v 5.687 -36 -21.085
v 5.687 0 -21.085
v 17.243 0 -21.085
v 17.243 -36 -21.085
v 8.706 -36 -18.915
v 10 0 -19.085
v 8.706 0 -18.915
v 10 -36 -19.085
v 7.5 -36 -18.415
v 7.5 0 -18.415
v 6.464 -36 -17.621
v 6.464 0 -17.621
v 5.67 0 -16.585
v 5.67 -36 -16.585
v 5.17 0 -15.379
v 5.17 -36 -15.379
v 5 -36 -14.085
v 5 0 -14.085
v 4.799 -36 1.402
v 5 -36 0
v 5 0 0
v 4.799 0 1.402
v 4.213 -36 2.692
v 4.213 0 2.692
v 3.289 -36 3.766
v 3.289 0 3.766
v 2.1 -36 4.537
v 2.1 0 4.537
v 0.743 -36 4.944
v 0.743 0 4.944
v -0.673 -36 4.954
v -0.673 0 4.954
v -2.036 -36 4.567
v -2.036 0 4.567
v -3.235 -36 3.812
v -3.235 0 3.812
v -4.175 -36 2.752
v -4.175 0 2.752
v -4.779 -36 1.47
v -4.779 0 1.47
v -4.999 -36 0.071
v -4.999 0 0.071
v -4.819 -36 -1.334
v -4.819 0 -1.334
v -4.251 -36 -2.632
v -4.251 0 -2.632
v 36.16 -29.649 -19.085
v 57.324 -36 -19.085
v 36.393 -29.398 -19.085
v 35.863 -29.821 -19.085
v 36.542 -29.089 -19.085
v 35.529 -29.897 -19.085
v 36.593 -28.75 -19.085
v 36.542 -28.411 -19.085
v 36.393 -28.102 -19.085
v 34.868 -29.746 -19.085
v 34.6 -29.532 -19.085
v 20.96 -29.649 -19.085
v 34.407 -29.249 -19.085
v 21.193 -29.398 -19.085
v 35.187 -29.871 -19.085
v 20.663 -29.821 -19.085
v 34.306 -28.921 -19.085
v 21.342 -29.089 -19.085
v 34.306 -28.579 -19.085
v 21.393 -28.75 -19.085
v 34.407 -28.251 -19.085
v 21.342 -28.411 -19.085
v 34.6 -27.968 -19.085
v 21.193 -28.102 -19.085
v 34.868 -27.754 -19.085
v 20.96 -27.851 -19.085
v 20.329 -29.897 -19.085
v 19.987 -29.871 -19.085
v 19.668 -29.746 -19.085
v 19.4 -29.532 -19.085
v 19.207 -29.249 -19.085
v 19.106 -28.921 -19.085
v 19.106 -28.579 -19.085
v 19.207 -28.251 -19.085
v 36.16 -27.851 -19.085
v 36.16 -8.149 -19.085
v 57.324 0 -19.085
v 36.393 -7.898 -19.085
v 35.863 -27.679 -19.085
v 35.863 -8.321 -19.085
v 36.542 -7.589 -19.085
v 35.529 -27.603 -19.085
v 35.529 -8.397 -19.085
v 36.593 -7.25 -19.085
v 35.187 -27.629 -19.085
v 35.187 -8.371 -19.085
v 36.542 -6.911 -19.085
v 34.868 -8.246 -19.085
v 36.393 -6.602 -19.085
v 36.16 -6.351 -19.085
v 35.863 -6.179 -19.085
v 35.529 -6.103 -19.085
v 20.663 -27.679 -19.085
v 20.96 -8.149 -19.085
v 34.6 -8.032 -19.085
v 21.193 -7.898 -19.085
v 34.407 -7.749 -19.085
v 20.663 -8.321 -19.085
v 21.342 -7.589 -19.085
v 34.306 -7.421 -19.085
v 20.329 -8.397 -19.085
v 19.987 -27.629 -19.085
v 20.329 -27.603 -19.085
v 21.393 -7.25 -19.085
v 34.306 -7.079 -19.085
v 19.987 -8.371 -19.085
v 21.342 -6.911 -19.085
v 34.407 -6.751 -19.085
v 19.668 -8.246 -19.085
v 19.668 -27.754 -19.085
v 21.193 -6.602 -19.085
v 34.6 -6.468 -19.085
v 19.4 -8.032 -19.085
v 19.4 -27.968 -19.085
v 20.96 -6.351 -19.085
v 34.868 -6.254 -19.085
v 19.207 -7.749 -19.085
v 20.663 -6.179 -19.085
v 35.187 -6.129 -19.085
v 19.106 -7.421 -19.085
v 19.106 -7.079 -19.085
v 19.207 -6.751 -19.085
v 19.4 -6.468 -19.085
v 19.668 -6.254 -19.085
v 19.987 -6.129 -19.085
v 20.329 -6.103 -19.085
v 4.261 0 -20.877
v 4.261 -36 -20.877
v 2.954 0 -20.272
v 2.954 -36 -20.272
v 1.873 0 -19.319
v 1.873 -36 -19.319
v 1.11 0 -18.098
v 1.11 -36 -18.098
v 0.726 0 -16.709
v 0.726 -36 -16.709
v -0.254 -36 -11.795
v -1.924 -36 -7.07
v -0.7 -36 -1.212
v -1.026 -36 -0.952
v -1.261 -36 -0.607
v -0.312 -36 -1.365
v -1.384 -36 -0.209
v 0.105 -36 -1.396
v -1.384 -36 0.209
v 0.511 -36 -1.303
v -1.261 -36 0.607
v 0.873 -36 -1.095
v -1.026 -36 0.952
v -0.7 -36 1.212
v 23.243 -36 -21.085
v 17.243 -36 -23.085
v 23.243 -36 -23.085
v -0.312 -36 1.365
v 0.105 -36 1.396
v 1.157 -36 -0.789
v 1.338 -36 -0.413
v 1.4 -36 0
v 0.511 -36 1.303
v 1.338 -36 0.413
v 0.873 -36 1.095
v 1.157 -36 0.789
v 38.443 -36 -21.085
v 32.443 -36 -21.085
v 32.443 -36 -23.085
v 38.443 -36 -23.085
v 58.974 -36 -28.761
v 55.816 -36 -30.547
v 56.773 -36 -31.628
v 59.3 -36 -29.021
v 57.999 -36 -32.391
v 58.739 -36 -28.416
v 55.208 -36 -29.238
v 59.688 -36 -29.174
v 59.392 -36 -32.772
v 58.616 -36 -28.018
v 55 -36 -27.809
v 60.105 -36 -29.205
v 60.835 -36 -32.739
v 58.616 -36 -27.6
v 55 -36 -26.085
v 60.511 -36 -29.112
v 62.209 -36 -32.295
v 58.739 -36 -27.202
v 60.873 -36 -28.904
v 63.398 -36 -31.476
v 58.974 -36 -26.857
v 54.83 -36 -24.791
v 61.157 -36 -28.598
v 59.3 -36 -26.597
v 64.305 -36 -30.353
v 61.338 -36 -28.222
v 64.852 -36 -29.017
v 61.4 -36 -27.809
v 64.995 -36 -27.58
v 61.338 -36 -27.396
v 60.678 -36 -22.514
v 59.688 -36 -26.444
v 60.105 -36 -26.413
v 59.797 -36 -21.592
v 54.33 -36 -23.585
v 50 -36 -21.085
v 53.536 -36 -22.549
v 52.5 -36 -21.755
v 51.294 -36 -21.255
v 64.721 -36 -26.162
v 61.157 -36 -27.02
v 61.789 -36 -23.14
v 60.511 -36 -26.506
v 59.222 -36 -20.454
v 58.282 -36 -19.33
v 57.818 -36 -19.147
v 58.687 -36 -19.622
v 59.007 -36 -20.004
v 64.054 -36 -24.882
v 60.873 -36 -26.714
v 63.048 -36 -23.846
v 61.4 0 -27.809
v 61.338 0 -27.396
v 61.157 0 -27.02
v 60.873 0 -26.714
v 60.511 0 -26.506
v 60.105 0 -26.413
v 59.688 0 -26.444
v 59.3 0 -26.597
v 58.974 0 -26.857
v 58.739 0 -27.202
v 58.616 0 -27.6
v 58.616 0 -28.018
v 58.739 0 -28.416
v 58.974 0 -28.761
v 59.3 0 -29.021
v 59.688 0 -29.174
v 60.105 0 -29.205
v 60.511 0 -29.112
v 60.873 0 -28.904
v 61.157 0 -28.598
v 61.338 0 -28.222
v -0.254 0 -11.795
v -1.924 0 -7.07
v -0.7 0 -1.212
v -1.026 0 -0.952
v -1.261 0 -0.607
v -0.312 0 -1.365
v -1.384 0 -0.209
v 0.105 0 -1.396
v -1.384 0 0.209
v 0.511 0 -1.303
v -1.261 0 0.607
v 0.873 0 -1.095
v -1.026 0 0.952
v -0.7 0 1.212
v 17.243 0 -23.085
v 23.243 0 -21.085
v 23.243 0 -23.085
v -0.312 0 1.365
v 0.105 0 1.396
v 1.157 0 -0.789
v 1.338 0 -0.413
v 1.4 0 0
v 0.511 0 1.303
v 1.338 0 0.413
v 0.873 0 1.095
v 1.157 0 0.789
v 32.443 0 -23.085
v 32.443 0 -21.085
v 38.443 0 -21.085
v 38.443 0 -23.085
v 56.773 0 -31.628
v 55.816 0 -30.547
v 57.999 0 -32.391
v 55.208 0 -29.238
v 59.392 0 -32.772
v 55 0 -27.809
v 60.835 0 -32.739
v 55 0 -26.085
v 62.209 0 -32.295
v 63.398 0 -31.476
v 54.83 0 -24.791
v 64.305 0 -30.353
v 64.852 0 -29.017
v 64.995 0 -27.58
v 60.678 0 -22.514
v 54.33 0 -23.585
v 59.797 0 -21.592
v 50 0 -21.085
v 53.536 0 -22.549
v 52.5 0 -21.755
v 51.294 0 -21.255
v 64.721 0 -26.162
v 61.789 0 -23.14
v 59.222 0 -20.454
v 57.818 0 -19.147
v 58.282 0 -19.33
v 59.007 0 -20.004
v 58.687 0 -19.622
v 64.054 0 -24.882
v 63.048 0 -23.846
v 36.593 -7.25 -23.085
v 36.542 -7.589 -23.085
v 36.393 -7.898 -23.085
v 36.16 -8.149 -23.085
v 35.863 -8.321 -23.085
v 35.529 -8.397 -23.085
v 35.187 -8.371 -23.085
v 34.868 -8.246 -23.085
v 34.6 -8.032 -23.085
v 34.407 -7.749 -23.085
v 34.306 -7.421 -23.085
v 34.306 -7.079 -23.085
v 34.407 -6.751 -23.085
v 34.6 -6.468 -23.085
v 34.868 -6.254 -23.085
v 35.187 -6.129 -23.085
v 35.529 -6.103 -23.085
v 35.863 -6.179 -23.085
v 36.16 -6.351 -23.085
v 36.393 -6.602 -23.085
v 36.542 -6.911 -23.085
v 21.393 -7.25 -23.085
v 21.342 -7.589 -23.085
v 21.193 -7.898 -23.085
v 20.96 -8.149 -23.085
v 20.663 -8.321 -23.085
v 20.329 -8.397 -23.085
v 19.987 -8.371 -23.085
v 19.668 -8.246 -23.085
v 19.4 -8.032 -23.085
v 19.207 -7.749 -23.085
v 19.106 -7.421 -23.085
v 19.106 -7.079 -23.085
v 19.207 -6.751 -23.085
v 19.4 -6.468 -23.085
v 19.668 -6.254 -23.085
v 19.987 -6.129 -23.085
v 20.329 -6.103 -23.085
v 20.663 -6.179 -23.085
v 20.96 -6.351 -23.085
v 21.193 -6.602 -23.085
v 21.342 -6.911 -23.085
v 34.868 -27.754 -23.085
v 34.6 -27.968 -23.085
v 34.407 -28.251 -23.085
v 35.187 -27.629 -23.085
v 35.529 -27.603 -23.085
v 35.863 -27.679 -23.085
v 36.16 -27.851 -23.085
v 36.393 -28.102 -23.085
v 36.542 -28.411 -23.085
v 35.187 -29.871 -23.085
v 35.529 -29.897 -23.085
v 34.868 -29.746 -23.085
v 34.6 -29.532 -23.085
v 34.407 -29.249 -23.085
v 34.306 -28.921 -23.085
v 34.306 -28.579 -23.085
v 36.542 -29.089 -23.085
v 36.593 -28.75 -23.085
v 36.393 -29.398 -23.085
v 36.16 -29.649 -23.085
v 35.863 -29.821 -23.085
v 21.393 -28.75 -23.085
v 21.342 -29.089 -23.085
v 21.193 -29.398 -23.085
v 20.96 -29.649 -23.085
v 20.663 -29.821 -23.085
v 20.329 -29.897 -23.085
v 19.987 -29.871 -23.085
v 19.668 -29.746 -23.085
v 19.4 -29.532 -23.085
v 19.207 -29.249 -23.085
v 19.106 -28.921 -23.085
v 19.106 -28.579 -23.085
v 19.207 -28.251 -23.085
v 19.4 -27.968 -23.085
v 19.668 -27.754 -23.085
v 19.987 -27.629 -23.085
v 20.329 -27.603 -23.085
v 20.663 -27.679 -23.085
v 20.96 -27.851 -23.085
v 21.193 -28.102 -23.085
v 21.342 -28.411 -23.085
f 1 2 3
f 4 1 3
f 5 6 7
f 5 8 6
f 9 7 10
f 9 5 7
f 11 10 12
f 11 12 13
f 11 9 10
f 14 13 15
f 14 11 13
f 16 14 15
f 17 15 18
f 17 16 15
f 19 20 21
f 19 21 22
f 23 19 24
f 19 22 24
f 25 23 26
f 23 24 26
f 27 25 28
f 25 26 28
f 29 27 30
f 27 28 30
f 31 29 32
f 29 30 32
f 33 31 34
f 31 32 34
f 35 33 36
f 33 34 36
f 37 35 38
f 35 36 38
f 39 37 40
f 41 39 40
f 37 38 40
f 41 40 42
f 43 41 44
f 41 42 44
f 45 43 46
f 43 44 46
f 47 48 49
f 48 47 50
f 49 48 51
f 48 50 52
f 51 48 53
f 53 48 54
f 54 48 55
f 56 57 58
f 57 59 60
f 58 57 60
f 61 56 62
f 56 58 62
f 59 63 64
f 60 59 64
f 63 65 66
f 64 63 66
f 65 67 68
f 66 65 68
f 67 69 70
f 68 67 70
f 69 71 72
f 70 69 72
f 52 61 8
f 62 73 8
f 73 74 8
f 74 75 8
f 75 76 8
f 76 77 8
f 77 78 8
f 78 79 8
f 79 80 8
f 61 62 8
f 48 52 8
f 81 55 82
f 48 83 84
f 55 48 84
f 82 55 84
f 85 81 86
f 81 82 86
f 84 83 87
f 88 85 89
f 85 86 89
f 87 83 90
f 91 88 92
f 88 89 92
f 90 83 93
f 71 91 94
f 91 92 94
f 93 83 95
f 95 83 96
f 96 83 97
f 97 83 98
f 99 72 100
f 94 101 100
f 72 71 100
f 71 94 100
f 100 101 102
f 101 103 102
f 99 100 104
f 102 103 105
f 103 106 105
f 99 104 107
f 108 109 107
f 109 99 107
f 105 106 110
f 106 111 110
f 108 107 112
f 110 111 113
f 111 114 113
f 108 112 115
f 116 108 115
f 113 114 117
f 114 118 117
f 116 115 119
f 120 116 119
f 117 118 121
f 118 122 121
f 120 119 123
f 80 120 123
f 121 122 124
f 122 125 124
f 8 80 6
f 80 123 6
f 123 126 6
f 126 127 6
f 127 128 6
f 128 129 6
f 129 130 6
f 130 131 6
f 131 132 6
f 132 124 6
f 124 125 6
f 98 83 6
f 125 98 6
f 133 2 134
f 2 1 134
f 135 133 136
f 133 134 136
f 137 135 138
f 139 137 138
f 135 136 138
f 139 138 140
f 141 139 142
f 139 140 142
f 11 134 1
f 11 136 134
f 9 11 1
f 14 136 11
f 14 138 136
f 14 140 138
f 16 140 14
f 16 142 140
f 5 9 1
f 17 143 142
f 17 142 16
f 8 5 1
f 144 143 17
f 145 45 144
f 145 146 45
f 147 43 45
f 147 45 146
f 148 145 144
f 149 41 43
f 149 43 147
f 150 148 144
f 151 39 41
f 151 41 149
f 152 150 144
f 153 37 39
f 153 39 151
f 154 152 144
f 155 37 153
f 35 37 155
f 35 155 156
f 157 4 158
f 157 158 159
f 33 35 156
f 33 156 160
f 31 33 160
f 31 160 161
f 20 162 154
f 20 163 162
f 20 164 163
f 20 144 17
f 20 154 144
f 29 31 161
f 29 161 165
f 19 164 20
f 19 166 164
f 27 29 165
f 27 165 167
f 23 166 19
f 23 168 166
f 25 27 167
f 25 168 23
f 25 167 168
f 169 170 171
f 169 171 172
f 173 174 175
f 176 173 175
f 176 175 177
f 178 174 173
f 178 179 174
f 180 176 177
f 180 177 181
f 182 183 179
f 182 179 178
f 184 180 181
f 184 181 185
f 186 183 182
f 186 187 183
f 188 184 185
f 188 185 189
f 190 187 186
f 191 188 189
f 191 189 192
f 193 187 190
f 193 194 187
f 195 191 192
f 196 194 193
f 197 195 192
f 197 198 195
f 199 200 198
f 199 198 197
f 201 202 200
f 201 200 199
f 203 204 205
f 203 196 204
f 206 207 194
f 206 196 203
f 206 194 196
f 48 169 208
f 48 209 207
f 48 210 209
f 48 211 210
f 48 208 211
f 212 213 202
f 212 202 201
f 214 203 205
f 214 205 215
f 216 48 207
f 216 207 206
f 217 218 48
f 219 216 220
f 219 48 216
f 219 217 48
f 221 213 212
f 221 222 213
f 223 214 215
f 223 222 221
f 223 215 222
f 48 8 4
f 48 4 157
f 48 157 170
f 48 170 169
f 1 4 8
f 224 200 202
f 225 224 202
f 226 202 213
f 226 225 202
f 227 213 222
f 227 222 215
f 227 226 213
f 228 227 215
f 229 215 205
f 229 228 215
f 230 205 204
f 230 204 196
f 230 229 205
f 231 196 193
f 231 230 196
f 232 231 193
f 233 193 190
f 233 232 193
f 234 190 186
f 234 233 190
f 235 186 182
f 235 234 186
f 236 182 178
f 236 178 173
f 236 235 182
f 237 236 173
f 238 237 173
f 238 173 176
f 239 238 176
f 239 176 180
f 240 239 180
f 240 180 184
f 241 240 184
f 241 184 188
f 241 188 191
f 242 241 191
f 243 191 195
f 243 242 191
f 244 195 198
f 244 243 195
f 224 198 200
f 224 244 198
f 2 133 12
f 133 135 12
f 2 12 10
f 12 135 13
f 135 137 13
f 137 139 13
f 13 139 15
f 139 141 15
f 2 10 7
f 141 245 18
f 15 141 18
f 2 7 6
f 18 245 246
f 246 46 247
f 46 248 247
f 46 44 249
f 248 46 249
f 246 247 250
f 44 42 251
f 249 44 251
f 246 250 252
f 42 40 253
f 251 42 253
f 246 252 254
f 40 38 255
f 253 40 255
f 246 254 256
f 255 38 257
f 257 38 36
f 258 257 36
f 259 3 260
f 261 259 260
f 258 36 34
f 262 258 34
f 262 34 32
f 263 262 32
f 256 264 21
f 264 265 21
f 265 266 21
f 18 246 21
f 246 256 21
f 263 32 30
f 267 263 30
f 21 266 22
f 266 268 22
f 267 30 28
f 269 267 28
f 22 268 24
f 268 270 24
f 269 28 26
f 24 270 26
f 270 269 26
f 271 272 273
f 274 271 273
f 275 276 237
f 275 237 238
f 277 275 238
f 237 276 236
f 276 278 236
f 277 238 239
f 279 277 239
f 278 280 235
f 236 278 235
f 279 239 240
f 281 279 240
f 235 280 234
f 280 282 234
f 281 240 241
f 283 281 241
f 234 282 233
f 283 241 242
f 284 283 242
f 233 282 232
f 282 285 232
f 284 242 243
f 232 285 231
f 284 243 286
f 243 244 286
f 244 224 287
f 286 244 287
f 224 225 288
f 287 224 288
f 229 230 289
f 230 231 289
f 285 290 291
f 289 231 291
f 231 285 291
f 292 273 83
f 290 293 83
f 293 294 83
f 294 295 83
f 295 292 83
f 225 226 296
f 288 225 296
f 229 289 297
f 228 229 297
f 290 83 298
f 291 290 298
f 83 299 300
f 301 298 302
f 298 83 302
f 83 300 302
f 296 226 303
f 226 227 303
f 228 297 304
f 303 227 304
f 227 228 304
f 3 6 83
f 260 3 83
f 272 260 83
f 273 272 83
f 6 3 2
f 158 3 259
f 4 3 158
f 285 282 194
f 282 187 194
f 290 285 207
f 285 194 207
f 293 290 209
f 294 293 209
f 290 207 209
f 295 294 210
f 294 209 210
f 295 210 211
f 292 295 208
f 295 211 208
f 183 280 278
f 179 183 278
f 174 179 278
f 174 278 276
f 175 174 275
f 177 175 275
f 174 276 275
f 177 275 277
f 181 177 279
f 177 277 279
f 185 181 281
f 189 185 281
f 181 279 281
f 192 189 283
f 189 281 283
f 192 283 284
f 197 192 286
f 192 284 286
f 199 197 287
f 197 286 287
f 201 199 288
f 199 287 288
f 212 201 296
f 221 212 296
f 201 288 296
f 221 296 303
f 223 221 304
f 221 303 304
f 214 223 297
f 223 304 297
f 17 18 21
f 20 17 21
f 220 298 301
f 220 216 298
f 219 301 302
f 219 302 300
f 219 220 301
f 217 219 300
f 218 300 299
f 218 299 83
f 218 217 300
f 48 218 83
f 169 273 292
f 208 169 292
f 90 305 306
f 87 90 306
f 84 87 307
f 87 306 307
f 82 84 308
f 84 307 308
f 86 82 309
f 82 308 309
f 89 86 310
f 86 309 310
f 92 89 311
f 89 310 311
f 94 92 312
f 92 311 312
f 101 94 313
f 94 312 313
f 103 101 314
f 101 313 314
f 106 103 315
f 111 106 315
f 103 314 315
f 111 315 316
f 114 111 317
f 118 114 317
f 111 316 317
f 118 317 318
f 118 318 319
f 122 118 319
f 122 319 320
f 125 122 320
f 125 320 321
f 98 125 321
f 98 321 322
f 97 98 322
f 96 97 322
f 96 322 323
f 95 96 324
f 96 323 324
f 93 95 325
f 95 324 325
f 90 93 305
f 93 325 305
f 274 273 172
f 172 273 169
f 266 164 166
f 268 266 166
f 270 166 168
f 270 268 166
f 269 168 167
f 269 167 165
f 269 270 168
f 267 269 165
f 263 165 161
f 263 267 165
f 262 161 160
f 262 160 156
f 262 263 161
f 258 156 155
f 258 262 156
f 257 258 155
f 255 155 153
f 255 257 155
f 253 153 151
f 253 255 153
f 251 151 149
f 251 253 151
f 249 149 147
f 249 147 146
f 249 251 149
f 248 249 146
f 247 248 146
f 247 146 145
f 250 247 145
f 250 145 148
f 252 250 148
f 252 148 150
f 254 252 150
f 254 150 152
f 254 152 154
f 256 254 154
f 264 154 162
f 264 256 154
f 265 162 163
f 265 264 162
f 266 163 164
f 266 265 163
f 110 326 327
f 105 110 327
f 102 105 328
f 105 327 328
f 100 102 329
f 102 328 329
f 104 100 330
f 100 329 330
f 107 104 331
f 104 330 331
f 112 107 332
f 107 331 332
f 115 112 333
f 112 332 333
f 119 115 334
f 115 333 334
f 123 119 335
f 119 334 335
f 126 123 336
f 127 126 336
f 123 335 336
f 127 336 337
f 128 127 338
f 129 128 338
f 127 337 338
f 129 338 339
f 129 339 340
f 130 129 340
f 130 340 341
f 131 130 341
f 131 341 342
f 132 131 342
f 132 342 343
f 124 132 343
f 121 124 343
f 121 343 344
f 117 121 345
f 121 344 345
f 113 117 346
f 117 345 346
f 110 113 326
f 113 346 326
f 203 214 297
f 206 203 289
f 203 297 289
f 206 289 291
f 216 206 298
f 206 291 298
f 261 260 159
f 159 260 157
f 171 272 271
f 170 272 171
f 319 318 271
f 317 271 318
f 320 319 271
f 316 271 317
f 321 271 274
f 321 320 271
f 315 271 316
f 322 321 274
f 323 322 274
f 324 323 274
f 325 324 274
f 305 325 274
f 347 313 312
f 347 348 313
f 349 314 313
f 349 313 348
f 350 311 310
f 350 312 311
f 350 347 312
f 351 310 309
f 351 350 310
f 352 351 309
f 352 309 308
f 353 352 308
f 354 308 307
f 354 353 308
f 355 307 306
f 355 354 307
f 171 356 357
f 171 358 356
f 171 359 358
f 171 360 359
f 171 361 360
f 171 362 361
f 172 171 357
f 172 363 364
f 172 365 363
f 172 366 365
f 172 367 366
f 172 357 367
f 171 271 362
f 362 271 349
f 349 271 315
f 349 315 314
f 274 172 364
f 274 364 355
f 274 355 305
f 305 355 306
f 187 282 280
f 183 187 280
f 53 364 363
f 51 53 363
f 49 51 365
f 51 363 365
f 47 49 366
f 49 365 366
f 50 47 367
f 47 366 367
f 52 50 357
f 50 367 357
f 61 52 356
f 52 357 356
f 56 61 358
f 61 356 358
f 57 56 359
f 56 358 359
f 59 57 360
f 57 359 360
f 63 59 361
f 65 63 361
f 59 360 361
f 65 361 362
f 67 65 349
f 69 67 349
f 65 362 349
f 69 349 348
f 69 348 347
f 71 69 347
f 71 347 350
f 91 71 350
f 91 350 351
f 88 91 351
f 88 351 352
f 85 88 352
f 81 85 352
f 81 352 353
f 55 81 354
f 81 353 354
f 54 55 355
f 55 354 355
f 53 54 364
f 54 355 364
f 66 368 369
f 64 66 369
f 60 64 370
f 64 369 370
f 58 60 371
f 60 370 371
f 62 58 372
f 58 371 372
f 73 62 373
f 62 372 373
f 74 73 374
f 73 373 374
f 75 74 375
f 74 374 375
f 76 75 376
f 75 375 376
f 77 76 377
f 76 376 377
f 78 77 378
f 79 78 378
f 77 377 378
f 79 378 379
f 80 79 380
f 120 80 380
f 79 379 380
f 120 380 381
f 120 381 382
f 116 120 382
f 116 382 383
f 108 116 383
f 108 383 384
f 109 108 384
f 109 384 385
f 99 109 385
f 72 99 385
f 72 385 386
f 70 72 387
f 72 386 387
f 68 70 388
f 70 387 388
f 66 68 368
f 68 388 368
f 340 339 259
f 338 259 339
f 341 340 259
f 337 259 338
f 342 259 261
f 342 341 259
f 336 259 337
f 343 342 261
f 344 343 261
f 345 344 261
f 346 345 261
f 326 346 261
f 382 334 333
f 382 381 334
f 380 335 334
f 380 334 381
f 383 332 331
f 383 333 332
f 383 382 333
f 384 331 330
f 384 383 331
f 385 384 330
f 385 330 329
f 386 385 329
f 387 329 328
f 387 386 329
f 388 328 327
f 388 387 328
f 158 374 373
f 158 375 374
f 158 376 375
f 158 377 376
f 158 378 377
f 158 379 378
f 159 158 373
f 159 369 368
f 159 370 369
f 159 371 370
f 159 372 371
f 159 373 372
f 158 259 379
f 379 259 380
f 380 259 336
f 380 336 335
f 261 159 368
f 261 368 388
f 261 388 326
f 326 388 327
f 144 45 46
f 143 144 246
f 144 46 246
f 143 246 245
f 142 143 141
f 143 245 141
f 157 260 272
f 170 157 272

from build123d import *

# Parameters (mm, degrees)
F0_R     = 1.4
F1_DEPTH = 36
F2_R     = 5
F3_W     = 6
F3_H     = 36
F4_DEPTH = 2
F5_R     = 2
F6_R     = 1.15
F7_DEPTH = 4


with BuildPart() as f1:
    # F0 (on Front) → F1 (new body)
    with BuildSketch(Plane.XZ):
        with BuildLine():
            Line((55, -21.085023), (55, -27.809023))
            ThreePointArc((55, -27.809023), (62.833366, -31.928737), (61.788816, -23.139961))
            ThreePointArc((61.788816, -23.139961), (59.764502, -21.545715), (59, -19.085023))
            Line((59, -19.085023), (5, -19.085023))
            Line((5, -19.085023), (5, 0))
            ThreePointArc((5, 0), (-1.368482, 4.809081), (-4.250902, -2.632457))
            ThreePointArc((-4.250902, -2.632457), (-0.338276, -11.492459), (1, -21.085023))
            Line((1, -21.085023), (55, -21.085023))
        make_face()
        with Locations((60, -27.809023)):
            Circle(F0_R, mode=Mode.SUBTRACT)
        Circle(F0_R, mode=Mode.SUBTRACT)
    extrude(amount=F1_DEPTH)

    # F2
    f2_edges = [f1.edges().sort_by_distance(p)[0] for p in [
        (5, -18, -19.085023),
        (1, -18, -21.085023),
        (55, -18, -21.085023),
    ]]
    fillet(f2_edges, radius=F2_R)

    # F3 (on face) → F4 (join)
    with BuildSketch(Plane(origin=(0, 0, -21.085023), x_dir=(1, 0, 0), z_dir=(0, 0, -1))):
        with Locations((20.243325, 18)):
            Rectangle(F3_W, F3_H)
        with Locations((35.443325, 18)):
            Rectangle(F3_W, F3_H)
    extrude(amount=F4_DEPTH)

    # F5
    f5_edges = [f1.edges().sort_by_distance(p)[0] for p in [
        (59, -18, -19.085023),
    ]]
    fillet(f5_edges, radius=F5_R)

    # F6 (on face) → F7 (cut, through all)
    with BuildSketch(Plane(origin=(0, 0, -23.085023), x_dir=(1, 0, 0), z_dir=(0, 0, -1))):
        with Locations((20.243325, 28.75)):
            Circle(F6_R)
        with Locations((35.443325, 28.75)):
            Circle(F6_R)
        with Locations((20.243325, 7.25)):
            Circle(F6_R)
        with Locations((35.443325, 7.25)):
            Circle(F6_R)
    extrude(amount=-F7_DEPTH, mode=Mode.SUBTRACT)


solid = f1.part
